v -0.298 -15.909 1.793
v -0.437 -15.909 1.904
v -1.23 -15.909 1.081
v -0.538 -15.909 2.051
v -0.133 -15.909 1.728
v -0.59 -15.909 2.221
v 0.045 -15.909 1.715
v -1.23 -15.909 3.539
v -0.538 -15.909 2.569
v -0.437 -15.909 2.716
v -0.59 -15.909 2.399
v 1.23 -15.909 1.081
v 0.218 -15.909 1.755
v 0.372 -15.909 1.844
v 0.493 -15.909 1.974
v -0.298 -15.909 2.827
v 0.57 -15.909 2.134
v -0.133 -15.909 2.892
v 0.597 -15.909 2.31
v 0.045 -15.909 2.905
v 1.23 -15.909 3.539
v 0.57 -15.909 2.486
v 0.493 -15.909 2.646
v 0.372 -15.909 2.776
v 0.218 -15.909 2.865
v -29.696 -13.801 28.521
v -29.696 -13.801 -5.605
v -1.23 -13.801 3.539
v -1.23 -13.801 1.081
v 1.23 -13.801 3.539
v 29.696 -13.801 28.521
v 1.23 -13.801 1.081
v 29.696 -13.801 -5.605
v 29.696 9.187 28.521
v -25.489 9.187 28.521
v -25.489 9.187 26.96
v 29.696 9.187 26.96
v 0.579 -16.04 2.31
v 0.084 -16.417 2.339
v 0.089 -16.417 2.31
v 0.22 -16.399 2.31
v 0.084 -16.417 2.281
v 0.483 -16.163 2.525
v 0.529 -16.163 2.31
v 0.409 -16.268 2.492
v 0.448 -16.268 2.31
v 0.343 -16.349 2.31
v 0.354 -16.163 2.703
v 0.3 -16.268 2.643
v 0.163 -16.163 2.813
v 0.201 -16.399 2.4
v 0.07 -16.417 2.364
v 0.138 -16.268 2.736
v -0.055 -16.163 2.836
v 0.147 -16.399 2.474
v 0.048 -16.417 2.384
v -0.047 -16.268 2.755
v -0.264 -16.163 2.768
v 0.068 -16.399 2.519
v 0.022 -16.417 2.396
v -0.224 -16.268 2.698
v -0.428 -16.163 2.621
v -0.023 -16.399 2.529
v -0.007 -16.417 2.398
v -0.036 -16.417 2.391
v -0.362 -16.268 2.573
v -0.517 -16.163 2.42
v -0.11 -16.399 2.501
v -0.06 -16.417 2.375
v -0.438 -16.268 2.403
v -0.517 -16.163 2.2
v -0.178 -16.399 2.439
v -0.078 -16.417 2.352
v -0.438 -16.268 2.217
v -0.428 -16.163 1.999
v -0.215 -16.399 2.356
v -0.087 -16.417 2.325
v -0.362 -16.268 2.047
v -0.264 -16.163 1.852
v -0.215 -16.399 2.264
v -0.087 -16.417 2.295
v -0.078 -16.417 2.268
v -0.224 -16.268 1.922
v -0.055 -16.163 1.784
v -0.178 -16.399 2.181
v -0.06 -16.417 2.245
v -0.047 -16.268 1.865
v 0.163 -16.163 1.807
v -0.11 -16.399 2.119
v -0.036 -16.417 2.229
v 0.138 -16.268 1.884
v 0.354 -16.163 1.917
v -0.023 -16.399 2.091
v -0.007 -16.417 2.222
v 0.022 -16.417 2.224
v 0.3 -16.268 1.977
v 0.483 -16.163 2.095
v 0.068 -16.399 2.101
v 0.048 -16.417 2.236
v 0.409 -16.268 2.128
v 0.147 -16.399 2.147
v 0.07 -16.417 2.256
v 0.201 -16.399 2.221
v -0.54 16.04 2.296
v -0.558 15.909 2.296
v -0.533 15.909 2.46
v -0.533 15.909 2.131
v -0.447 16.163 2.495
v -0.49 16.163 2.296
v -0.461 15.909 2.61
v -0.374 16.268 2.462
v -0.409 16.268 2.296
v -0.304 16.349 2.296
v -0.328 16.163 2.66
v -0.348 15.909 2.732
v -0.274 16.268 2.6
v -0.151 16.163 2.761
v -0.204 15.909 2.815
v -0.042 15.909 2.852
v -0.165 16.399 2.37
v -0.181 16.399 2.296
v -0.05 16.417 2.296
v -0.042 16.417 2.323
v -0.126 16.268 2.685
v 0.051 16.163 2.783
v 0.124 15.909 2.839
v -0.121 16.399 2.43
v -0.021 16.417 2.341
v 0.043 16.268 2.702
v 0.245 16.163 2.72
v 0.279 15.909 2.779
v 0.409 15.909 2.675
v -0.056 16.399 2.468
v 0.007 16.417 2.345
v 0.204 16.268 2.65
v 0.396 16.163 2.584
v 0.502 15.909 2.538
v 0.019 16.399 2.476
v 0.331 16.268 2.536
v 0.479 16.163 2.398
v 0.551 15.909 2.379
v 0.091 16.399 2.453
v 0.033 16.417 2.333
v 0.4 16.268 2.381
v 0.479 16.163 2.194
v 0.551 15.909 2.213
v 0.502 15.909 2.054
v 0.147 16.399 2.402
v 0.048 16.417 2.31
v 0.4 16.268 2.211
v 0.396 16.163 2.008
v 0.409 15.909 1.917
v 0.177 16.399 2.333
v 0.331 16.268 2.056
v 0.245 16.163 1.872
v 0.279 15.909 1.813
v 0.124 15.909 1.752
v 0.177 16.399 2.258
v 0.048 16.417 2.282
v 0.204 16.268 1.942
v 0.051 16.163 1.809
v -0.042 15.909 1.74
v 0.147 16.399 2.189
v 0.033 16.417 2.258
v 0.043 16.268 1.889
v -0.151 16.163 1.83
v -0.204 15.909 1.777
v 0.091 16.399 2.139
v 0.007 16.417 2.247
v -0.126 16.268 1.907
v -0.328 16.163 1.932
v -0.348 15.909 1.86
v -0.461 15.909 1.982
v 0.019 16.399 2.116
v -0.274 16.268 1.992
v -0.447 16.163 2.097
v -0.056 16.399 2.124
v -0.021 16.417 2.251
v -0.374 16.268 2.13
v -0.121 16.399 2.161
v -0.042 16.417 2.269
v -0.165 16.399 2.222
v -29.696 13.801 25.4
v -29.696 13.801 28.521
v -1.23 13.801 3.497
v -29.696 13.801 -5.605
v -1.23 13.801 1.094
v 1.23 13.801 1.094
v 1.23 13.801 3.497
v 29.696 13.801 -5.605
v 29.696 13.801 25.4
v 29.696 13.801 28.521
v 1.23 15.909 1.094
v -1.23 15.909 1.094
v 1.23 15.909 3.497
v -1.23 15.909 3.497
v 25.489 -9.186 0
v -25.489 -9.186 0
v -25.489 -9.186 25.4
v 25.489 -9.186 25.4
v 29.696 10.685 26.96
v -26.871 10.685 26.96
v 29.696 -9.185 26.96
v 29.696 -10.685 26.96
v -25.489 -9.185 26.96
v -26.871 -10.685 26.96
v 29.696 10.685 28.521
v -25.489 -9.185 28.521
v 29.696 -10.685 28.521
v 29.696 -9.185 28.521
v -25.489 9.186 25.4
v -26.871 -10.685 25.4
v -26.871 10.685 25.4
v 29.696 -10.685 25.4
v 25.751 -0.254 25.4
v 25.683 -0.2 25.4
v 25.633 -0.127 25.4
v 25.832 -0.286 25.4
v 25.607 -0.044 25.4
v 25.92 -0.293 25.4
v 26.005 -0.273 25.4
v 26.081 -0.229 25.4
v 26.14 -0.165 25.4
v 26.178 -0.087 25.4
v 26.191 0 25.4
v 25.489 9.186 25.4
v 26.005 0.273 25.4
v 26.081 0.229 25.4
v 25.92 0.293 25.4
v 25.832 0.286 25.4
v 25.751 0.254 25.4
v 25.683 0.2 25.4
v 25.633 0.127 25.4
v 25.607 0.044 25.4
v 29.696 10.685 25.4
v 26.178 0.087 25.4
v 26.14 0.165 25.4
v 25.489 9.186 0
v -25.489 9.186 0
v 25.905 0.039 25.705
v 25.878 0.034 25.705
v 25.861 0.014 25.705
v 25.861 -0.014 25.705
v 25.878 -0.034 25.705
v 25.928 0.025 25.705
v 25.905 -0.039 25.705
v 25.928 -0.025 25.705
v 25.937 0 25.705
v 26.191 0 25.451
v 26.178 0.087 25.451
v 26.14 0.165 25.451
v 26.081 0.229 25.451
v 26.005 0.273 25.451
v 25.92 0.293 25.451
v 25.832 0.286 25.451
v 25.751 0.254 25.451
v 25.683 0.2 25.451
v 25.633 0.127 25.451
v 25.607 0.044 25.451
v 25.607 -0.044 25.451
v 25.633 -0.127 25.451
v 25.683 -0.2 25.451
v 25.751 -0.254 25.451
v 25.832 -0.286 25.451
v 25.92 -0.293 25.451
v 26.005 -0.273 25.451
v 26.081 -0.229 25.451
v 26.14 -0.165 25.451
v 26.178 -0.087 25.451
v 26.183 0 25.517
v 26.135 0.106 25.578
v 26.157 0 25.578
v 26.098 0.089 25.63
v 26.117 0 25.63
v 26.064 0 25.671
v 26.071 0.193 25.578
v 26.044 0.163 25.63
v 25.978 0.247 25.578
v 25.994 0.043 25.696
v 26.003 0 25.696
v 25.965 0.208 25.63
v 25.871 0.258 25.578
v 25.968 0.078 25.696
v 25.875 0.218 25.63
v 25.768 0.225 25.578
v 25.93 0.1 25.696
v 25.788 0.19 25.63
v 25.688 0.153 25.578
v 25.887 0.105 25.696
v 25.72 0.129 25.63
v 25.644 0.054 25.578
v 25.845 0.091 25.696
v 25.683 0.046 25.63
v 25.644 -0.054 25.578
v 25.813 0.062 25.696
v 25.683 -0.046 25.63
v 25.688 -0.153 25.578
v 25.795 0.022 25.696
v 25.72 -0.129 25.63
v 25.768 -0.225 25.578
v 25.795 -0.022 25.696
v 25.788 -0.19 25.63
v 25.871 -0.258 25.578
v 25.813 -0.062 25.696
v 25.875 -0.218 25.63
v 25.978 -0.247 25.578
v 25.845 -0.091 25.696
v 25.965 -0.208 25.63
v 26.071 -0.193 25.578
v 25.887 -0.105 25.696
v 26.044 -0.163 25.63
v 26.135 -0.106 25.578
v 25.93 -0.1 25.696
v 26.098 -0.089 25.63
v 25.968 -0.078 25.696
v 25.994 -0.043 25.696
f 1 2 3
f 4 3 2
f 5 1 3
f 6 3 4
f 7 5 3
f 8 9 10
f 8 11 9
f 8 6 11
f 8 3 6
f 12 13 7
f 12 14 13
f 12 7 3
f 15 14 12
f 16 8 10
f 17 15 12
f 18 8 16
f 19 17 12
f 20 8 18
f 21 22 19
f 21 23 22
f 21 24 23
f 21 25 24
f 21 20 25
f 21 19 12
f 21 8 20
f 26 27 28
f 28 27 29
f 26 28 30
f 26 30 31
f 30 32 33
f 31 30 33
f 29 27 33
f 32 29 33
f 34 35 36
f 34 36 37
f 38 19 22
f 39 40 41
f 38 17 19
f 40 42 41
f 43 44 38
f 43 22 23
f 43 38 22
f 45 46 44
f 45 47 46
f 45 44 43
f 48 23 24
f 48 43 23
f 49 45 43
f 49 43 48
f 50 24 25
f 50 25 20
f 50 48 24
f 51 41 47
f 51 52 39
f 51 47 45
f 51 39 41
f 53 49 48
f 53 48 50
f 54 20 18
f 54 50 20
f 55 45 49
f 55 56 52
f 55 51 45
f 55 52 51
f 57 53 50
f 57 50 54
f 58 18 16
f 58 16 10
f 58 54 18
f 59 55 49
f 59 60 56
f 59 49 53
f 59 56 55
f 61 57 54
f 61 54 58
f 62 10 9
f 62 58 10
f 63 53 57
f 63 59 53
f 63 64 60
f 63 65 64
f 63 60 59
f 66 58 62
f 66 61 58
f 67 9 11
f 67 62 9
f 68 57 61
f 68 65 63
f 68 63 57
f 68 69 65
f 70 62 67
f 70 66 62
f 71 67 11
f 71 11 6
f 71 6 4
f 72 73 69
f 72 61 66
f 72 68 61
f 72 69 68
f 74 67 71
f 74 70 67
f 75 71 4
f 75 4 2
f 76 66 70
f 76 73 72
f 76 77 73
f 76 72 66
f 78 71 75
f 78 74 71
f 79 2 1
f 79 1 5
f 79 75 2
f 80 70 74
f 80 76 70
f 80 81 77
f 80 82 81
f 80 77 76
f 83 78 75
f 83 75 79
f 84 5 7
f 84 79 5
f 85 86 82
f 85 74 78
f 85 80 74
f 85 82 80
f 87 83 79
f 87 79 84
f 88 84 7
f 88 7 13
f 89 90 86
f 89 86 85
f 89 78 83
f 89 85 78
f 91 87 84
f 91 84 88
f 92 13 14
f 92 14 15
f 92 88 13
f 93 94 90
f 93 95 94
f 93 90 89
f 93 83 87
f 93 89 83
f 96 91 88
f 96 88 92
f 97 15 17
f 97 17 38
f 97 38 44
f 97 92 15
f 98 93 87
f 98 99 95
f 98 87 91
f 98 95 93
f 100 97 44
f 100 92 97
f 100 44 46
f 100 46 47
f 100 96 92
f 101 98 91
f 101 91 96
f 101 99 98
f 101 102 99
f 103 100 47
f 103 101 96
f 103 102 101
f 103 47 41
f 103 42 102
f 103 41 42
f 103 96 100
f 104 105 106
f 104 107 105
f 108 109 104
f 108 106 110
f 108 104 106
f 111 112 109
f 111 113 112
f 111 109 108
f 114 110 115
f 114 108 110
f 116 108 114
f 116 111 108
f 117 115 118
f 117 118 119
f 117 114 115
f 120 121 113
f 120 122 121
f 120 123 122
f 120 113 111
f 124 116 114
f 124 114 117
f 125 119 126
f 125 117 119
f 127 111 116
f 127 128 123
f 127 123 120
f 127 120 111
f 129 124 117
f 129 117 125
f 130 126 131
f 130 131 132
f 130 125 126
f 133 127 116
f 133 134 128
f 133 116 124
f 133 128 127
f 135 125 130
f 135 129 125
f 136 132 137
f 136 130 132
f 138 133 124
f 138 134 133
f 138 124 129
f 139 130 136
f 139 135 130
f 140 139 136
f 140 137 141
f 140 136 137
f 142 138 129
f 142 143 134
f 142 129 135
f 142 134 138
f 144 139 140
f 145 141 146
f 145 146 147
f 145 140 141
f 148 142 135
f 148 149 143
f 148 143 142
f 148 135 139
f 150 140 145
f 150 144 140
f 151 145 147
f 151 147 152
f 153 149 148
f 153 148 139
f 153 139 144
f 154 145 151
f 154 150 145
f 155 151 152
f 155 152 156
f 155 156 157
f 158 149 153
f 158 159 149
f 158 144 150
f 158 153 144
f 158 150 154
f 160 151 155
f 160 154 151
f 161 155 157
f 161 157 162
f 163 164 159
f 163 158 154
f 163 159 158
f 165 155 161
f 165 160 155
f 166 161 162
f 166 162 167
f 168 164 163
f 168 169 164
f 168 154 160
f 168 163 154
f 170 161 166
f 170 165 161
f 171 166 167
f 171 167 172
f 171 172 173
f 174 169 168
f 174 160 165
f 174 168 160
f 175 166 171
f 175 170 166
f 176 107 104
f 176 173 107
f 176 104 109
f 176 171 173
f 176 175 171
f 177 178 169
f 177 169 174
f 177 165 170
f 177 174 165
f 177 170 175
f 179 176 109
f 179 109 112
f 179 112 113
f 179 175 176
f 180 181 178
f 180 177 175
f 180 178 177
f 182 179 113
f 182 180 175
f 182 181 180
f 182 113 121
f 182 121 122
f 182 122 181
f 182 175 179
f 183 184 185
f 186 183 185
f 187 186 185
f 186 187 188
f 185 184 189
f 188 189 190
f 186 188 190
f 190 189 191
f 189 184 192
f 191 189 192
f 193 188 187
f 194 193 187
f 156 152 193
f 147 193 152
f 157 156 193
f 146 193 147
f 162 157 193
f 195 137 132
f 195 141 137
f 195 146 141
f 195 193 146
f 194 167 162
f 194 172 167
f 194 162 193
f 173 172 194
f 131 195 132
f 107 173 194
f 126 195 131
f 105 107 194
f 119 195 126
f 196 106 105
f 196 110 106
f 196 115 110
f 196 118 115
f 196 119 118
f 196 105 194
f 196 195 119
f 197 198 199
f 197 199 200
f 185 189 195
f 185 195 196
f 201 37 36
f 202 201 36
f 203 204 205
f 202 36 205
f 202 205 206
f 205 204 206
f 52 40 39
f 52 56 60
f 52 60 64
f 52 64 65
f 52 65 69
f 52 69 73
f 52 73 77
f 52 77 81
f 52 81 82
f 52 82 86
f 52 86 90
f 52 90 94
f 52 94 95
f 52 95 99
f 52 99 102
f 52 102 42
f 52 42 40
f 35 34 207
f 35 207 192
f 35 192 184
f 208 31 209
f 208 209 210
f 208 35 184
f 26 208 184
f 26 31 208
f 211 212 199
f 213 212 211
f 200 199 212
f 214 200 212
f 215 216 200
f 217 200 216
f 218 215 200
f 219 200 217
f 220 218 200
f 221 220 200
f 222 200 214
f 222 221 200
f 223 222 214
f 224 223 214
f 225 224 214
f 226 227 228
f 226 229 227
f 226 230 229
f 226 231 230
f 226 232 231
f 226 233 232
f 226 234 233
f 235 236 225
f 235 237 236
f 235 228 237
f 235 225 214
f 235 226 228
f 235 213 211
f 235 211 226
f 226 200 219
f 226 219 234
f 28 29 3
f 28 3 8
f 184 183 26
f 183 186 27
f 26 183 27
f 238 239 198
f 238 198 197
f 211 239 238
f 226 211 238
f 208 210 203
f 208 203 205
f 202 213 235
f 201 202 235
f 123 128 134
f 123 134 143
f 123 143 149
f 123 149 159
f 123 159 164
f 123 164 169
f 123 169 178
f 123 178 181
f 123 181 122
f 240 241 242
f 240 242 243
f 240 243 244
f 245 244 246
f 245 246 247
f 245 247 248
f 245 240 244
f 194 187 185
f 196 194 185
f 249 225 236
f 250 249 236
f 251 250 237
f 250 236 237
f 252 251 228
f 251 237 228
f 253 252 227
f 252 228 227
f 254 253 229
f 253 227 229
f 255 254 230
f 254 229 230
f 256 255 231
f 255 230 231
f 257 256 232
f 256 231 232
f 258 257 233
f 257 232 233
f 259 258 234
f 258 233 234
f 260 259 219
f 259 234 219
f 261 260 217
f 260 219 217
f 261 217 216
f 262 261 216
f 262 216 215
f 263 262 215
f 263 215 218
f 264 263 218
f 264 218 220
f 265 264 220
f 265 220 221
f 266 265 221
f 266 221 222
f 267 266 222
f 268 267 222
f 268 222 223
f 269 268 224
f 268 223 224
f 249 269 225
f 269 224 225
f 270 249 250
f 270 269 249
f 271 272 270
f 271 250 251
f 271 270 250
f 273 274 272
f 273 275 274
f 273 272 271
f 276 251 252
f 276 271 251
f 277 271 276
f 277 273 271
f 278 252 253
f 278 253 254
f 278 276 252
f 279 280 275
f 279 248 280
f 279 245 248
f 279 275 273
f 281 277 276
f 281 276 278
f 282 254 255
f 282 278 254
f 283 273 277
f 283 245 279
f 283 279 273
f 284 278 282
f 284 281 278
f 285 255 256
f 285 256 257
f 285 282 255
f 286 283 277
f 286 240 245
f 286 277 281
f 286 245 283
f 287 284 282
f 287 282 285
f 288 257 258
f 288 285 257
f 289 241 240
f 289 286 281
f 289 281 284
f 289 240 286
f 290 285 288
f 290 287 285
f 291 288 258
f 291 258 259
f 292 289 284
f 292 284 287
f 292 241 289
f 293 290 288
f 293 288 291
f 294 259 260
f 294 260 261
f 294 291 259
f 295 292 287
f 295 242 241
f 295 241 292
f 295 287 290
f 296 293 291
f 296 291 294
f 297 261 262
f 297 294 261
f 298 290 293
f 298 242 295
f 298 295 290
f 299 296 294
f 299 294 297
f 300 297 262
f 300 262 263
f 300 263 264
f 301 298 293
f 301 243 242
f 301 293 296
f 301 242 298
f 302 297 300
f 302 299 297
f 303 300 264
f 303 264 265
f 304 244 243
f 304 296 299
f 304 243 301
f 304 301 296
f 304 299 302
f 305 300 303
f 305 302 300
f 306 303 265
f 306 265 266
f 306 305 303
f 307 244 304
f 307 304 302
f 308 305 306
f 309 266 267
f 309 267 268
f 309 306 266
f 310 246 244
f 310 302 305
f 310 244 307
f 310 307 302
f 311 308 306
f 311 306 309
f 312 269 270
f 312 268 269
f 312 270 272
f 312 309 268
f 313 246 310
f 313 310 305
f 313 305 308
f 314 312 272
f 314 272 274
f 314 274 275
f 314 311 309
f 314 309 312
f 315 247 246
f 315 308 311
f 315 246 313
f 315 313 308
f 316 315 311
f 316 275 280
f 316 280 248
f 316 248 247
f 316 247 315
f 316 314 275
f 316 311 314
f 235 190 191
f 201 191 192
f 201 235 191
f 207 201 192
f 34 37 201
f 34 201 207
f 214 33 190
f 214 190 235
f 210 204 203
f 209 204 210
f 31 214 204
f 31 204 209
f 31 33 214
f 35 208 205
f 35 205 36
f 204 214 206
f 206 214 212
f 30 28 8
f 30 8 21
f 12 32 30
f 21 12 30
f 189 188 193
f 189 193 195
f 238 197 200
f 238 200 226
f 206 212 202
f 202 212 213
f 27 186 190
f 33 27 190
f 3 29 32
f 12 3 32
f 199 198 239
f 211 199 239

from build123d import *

# Parameters (mm, degrees)
F1_W      = 59.3920350075
F1_H      = 27.6011824608
F1_W_2    = 50.9779006243
F1_H_2    = 18.371000886
F2_DEPTH  = 25.4
F0_W      = 59.3920350075
F0_H      = 27.6011824608
F3_DEPTH  = 5.604719976
F18_DEPTH = 3.1209578738
F6_W      = 56.5673206002
F6_H      = 1.5604789369
F7_DEPTH  = 1.4987937175
F8_W      = 56.5673206002
F8_H      = 1.5604789369
F19_DEPTH = 1.4998847619
F5_W      = 21.3707275689
F5_H      = 1.5604789369
F9_DEPTH  = 1.382375136
F20_R     = 0.2935322564
F10_DEPTH = 0.3048
F21_R     = 0.254
F22_W     = 2.4601090699
F22_H     = 2.4032953017
F11_DEPTH = 2.1082
F12_R     = 0.5576398104
F13_DEPTH = 0.508
F14_R     = 0.50799
F23_W     = 2.4601090699
F23_H     = 2.4571502453
F15_DEPTH = 2.1082
F24_R     = 0.5965812211
F16_DEPTH = 0.508
F17_R     = 0.50799


# Not quite as in the source:
# - a fillet or chamfer is up to 0.001 mm smaller than in the source, because OpenCascade refuses the exact size


with BuildPart() as f2:
    # F1 (on face) → F2 (new body)
    with BuildSketch(Plane.XY):
        Rectangle(F1_W, F1_H)
        Rectangle(F1_W_2, F1_H_2, mode=Mode.SUBTRACT)
    extrude(amount=F2_DEPTH)

    # F0 (on Top) → F3 (join)
    with BuildSketch(Plane.XY):
        Rectangle(F0_W, F0_H)
    extrude(amount=-F3_DEPTH)

    # F4 (on face) → F18 (join)
    with BuildSketch(Plane.XY.offset(25.4)):
        Polygon((29.6960175037, -13.8005912304), (29.6960175037, -10.6853637844), (-26.8713030964, -10.6853637844), (-26.8713030964, 10.6853637844), (29.6960175037, 10.6853637844), (29.6960175037, 13.8005912304), (-29.6960175037, 13.8005912304), (-29.6960175037, -13.8005912304), align=None)
    extrude(amount=F18_DEPTH)

    # F6 (on face) → F7 (join)
    with BuildSketch(Plane.XZ.offset(-10.6853637844)):
        with Locations((1.4123572037, 27.7407184053)):
            Rectangle(F6_W, F6_H)
    extrude(amount=F7_DEPTH)

    # F8 (on face) → F19 (join)
    with BuildSketch(Plane(origin=(0, -10.6853637844, 0), x_dir=(-1, 0, 0), z_dir=(0, 1, 0))):
        with Locations((-1.4123572037, 27.7407184053)):
            Rectangle(F8_W, F8_H)
    extrude(amount=F19_DEPTH)

    # F5 (on face) → F9 (join)
    with BuildSketch(Plane.YZ.offset(-26.8713030964)):
        with Locations((0, 27.7407184053)):
            Rectangle(F5_W, F5_H)
    extrude(amount=F9_DEPTH)

    # F20 (on face) → F10 (join)
    with BuildSketch(Plane.XY.offset(25.4)):
        with Locations((25.8976798505, 0)):
            Circle(F20_R)
    extrude(amount=F10_DEPTH)

    # F21
    f21_edges = [f2.edges().sort_by_distance(p)[0] for p in [
        (25.604148, 0, 25.7048),
    ]]
    fillet(f21_edges, radius=F21_R)

    # F22 (on face) → F11 (join)
    with BuildSketch(Plane(origin=(0, 13.8005912304, 0), x_dir=(-1, 0, 0), z_dir=(0, 1, 0))):
        with Locations((0, 2.2958383197)):
            Rectangle(F22_W, F22_H)
    extrude(amount=F11_DEPTH)

    # F12 (on face) → F13 (join)
    with BuildSketch(Plane(origin=(0, 15.9087912304, 0), x_dir=(-1, 0, 0), z_dir=(0, 1, 0))):
        with Locations((0, 2.2958383197)):
            Circle(F12_R)
    extrude(amount=F13_DEPTH)

    # F14 (radius 0.508 in the source; OpenCascade refuses exactly that, so slightly less here)
    f14_edges = [f2.edges().sort_by_distance(p)[0] for p in [
        (0.55764, 16.416791, 2.295838),
    ]]
    fillet(f14_edges, radius=F14_R)

    # F23 (on face) → F15 (join)
    with BuildSketch(Plane.XZ.offset(13.8005912304)):
        with Locations((0, 2.3100455292)):
            Rectangle(F23_W, F23_H)
    extrude(amount=F15_DEPTH)

    # F24 (on face) → F16 (join)
    with BuildSketch(Plane.XZ.offset(15.9087912304)):
        with Locations((0, 2.3100455292)):
            Circle(F24_R)
    extrude(amount=F16_DEPTH)

    # F17 (radius 0.508 in the source; OpenCascade refuses exactly that, so slightly less here)
    f17_edges = [f2.edges().sort_by_distance(p)[0] for p in [
        (-0.596581, -16.416791, 2.310046),
    ]]
    fillet(f17_edges, radius=F17_R)


solid = f2.part
